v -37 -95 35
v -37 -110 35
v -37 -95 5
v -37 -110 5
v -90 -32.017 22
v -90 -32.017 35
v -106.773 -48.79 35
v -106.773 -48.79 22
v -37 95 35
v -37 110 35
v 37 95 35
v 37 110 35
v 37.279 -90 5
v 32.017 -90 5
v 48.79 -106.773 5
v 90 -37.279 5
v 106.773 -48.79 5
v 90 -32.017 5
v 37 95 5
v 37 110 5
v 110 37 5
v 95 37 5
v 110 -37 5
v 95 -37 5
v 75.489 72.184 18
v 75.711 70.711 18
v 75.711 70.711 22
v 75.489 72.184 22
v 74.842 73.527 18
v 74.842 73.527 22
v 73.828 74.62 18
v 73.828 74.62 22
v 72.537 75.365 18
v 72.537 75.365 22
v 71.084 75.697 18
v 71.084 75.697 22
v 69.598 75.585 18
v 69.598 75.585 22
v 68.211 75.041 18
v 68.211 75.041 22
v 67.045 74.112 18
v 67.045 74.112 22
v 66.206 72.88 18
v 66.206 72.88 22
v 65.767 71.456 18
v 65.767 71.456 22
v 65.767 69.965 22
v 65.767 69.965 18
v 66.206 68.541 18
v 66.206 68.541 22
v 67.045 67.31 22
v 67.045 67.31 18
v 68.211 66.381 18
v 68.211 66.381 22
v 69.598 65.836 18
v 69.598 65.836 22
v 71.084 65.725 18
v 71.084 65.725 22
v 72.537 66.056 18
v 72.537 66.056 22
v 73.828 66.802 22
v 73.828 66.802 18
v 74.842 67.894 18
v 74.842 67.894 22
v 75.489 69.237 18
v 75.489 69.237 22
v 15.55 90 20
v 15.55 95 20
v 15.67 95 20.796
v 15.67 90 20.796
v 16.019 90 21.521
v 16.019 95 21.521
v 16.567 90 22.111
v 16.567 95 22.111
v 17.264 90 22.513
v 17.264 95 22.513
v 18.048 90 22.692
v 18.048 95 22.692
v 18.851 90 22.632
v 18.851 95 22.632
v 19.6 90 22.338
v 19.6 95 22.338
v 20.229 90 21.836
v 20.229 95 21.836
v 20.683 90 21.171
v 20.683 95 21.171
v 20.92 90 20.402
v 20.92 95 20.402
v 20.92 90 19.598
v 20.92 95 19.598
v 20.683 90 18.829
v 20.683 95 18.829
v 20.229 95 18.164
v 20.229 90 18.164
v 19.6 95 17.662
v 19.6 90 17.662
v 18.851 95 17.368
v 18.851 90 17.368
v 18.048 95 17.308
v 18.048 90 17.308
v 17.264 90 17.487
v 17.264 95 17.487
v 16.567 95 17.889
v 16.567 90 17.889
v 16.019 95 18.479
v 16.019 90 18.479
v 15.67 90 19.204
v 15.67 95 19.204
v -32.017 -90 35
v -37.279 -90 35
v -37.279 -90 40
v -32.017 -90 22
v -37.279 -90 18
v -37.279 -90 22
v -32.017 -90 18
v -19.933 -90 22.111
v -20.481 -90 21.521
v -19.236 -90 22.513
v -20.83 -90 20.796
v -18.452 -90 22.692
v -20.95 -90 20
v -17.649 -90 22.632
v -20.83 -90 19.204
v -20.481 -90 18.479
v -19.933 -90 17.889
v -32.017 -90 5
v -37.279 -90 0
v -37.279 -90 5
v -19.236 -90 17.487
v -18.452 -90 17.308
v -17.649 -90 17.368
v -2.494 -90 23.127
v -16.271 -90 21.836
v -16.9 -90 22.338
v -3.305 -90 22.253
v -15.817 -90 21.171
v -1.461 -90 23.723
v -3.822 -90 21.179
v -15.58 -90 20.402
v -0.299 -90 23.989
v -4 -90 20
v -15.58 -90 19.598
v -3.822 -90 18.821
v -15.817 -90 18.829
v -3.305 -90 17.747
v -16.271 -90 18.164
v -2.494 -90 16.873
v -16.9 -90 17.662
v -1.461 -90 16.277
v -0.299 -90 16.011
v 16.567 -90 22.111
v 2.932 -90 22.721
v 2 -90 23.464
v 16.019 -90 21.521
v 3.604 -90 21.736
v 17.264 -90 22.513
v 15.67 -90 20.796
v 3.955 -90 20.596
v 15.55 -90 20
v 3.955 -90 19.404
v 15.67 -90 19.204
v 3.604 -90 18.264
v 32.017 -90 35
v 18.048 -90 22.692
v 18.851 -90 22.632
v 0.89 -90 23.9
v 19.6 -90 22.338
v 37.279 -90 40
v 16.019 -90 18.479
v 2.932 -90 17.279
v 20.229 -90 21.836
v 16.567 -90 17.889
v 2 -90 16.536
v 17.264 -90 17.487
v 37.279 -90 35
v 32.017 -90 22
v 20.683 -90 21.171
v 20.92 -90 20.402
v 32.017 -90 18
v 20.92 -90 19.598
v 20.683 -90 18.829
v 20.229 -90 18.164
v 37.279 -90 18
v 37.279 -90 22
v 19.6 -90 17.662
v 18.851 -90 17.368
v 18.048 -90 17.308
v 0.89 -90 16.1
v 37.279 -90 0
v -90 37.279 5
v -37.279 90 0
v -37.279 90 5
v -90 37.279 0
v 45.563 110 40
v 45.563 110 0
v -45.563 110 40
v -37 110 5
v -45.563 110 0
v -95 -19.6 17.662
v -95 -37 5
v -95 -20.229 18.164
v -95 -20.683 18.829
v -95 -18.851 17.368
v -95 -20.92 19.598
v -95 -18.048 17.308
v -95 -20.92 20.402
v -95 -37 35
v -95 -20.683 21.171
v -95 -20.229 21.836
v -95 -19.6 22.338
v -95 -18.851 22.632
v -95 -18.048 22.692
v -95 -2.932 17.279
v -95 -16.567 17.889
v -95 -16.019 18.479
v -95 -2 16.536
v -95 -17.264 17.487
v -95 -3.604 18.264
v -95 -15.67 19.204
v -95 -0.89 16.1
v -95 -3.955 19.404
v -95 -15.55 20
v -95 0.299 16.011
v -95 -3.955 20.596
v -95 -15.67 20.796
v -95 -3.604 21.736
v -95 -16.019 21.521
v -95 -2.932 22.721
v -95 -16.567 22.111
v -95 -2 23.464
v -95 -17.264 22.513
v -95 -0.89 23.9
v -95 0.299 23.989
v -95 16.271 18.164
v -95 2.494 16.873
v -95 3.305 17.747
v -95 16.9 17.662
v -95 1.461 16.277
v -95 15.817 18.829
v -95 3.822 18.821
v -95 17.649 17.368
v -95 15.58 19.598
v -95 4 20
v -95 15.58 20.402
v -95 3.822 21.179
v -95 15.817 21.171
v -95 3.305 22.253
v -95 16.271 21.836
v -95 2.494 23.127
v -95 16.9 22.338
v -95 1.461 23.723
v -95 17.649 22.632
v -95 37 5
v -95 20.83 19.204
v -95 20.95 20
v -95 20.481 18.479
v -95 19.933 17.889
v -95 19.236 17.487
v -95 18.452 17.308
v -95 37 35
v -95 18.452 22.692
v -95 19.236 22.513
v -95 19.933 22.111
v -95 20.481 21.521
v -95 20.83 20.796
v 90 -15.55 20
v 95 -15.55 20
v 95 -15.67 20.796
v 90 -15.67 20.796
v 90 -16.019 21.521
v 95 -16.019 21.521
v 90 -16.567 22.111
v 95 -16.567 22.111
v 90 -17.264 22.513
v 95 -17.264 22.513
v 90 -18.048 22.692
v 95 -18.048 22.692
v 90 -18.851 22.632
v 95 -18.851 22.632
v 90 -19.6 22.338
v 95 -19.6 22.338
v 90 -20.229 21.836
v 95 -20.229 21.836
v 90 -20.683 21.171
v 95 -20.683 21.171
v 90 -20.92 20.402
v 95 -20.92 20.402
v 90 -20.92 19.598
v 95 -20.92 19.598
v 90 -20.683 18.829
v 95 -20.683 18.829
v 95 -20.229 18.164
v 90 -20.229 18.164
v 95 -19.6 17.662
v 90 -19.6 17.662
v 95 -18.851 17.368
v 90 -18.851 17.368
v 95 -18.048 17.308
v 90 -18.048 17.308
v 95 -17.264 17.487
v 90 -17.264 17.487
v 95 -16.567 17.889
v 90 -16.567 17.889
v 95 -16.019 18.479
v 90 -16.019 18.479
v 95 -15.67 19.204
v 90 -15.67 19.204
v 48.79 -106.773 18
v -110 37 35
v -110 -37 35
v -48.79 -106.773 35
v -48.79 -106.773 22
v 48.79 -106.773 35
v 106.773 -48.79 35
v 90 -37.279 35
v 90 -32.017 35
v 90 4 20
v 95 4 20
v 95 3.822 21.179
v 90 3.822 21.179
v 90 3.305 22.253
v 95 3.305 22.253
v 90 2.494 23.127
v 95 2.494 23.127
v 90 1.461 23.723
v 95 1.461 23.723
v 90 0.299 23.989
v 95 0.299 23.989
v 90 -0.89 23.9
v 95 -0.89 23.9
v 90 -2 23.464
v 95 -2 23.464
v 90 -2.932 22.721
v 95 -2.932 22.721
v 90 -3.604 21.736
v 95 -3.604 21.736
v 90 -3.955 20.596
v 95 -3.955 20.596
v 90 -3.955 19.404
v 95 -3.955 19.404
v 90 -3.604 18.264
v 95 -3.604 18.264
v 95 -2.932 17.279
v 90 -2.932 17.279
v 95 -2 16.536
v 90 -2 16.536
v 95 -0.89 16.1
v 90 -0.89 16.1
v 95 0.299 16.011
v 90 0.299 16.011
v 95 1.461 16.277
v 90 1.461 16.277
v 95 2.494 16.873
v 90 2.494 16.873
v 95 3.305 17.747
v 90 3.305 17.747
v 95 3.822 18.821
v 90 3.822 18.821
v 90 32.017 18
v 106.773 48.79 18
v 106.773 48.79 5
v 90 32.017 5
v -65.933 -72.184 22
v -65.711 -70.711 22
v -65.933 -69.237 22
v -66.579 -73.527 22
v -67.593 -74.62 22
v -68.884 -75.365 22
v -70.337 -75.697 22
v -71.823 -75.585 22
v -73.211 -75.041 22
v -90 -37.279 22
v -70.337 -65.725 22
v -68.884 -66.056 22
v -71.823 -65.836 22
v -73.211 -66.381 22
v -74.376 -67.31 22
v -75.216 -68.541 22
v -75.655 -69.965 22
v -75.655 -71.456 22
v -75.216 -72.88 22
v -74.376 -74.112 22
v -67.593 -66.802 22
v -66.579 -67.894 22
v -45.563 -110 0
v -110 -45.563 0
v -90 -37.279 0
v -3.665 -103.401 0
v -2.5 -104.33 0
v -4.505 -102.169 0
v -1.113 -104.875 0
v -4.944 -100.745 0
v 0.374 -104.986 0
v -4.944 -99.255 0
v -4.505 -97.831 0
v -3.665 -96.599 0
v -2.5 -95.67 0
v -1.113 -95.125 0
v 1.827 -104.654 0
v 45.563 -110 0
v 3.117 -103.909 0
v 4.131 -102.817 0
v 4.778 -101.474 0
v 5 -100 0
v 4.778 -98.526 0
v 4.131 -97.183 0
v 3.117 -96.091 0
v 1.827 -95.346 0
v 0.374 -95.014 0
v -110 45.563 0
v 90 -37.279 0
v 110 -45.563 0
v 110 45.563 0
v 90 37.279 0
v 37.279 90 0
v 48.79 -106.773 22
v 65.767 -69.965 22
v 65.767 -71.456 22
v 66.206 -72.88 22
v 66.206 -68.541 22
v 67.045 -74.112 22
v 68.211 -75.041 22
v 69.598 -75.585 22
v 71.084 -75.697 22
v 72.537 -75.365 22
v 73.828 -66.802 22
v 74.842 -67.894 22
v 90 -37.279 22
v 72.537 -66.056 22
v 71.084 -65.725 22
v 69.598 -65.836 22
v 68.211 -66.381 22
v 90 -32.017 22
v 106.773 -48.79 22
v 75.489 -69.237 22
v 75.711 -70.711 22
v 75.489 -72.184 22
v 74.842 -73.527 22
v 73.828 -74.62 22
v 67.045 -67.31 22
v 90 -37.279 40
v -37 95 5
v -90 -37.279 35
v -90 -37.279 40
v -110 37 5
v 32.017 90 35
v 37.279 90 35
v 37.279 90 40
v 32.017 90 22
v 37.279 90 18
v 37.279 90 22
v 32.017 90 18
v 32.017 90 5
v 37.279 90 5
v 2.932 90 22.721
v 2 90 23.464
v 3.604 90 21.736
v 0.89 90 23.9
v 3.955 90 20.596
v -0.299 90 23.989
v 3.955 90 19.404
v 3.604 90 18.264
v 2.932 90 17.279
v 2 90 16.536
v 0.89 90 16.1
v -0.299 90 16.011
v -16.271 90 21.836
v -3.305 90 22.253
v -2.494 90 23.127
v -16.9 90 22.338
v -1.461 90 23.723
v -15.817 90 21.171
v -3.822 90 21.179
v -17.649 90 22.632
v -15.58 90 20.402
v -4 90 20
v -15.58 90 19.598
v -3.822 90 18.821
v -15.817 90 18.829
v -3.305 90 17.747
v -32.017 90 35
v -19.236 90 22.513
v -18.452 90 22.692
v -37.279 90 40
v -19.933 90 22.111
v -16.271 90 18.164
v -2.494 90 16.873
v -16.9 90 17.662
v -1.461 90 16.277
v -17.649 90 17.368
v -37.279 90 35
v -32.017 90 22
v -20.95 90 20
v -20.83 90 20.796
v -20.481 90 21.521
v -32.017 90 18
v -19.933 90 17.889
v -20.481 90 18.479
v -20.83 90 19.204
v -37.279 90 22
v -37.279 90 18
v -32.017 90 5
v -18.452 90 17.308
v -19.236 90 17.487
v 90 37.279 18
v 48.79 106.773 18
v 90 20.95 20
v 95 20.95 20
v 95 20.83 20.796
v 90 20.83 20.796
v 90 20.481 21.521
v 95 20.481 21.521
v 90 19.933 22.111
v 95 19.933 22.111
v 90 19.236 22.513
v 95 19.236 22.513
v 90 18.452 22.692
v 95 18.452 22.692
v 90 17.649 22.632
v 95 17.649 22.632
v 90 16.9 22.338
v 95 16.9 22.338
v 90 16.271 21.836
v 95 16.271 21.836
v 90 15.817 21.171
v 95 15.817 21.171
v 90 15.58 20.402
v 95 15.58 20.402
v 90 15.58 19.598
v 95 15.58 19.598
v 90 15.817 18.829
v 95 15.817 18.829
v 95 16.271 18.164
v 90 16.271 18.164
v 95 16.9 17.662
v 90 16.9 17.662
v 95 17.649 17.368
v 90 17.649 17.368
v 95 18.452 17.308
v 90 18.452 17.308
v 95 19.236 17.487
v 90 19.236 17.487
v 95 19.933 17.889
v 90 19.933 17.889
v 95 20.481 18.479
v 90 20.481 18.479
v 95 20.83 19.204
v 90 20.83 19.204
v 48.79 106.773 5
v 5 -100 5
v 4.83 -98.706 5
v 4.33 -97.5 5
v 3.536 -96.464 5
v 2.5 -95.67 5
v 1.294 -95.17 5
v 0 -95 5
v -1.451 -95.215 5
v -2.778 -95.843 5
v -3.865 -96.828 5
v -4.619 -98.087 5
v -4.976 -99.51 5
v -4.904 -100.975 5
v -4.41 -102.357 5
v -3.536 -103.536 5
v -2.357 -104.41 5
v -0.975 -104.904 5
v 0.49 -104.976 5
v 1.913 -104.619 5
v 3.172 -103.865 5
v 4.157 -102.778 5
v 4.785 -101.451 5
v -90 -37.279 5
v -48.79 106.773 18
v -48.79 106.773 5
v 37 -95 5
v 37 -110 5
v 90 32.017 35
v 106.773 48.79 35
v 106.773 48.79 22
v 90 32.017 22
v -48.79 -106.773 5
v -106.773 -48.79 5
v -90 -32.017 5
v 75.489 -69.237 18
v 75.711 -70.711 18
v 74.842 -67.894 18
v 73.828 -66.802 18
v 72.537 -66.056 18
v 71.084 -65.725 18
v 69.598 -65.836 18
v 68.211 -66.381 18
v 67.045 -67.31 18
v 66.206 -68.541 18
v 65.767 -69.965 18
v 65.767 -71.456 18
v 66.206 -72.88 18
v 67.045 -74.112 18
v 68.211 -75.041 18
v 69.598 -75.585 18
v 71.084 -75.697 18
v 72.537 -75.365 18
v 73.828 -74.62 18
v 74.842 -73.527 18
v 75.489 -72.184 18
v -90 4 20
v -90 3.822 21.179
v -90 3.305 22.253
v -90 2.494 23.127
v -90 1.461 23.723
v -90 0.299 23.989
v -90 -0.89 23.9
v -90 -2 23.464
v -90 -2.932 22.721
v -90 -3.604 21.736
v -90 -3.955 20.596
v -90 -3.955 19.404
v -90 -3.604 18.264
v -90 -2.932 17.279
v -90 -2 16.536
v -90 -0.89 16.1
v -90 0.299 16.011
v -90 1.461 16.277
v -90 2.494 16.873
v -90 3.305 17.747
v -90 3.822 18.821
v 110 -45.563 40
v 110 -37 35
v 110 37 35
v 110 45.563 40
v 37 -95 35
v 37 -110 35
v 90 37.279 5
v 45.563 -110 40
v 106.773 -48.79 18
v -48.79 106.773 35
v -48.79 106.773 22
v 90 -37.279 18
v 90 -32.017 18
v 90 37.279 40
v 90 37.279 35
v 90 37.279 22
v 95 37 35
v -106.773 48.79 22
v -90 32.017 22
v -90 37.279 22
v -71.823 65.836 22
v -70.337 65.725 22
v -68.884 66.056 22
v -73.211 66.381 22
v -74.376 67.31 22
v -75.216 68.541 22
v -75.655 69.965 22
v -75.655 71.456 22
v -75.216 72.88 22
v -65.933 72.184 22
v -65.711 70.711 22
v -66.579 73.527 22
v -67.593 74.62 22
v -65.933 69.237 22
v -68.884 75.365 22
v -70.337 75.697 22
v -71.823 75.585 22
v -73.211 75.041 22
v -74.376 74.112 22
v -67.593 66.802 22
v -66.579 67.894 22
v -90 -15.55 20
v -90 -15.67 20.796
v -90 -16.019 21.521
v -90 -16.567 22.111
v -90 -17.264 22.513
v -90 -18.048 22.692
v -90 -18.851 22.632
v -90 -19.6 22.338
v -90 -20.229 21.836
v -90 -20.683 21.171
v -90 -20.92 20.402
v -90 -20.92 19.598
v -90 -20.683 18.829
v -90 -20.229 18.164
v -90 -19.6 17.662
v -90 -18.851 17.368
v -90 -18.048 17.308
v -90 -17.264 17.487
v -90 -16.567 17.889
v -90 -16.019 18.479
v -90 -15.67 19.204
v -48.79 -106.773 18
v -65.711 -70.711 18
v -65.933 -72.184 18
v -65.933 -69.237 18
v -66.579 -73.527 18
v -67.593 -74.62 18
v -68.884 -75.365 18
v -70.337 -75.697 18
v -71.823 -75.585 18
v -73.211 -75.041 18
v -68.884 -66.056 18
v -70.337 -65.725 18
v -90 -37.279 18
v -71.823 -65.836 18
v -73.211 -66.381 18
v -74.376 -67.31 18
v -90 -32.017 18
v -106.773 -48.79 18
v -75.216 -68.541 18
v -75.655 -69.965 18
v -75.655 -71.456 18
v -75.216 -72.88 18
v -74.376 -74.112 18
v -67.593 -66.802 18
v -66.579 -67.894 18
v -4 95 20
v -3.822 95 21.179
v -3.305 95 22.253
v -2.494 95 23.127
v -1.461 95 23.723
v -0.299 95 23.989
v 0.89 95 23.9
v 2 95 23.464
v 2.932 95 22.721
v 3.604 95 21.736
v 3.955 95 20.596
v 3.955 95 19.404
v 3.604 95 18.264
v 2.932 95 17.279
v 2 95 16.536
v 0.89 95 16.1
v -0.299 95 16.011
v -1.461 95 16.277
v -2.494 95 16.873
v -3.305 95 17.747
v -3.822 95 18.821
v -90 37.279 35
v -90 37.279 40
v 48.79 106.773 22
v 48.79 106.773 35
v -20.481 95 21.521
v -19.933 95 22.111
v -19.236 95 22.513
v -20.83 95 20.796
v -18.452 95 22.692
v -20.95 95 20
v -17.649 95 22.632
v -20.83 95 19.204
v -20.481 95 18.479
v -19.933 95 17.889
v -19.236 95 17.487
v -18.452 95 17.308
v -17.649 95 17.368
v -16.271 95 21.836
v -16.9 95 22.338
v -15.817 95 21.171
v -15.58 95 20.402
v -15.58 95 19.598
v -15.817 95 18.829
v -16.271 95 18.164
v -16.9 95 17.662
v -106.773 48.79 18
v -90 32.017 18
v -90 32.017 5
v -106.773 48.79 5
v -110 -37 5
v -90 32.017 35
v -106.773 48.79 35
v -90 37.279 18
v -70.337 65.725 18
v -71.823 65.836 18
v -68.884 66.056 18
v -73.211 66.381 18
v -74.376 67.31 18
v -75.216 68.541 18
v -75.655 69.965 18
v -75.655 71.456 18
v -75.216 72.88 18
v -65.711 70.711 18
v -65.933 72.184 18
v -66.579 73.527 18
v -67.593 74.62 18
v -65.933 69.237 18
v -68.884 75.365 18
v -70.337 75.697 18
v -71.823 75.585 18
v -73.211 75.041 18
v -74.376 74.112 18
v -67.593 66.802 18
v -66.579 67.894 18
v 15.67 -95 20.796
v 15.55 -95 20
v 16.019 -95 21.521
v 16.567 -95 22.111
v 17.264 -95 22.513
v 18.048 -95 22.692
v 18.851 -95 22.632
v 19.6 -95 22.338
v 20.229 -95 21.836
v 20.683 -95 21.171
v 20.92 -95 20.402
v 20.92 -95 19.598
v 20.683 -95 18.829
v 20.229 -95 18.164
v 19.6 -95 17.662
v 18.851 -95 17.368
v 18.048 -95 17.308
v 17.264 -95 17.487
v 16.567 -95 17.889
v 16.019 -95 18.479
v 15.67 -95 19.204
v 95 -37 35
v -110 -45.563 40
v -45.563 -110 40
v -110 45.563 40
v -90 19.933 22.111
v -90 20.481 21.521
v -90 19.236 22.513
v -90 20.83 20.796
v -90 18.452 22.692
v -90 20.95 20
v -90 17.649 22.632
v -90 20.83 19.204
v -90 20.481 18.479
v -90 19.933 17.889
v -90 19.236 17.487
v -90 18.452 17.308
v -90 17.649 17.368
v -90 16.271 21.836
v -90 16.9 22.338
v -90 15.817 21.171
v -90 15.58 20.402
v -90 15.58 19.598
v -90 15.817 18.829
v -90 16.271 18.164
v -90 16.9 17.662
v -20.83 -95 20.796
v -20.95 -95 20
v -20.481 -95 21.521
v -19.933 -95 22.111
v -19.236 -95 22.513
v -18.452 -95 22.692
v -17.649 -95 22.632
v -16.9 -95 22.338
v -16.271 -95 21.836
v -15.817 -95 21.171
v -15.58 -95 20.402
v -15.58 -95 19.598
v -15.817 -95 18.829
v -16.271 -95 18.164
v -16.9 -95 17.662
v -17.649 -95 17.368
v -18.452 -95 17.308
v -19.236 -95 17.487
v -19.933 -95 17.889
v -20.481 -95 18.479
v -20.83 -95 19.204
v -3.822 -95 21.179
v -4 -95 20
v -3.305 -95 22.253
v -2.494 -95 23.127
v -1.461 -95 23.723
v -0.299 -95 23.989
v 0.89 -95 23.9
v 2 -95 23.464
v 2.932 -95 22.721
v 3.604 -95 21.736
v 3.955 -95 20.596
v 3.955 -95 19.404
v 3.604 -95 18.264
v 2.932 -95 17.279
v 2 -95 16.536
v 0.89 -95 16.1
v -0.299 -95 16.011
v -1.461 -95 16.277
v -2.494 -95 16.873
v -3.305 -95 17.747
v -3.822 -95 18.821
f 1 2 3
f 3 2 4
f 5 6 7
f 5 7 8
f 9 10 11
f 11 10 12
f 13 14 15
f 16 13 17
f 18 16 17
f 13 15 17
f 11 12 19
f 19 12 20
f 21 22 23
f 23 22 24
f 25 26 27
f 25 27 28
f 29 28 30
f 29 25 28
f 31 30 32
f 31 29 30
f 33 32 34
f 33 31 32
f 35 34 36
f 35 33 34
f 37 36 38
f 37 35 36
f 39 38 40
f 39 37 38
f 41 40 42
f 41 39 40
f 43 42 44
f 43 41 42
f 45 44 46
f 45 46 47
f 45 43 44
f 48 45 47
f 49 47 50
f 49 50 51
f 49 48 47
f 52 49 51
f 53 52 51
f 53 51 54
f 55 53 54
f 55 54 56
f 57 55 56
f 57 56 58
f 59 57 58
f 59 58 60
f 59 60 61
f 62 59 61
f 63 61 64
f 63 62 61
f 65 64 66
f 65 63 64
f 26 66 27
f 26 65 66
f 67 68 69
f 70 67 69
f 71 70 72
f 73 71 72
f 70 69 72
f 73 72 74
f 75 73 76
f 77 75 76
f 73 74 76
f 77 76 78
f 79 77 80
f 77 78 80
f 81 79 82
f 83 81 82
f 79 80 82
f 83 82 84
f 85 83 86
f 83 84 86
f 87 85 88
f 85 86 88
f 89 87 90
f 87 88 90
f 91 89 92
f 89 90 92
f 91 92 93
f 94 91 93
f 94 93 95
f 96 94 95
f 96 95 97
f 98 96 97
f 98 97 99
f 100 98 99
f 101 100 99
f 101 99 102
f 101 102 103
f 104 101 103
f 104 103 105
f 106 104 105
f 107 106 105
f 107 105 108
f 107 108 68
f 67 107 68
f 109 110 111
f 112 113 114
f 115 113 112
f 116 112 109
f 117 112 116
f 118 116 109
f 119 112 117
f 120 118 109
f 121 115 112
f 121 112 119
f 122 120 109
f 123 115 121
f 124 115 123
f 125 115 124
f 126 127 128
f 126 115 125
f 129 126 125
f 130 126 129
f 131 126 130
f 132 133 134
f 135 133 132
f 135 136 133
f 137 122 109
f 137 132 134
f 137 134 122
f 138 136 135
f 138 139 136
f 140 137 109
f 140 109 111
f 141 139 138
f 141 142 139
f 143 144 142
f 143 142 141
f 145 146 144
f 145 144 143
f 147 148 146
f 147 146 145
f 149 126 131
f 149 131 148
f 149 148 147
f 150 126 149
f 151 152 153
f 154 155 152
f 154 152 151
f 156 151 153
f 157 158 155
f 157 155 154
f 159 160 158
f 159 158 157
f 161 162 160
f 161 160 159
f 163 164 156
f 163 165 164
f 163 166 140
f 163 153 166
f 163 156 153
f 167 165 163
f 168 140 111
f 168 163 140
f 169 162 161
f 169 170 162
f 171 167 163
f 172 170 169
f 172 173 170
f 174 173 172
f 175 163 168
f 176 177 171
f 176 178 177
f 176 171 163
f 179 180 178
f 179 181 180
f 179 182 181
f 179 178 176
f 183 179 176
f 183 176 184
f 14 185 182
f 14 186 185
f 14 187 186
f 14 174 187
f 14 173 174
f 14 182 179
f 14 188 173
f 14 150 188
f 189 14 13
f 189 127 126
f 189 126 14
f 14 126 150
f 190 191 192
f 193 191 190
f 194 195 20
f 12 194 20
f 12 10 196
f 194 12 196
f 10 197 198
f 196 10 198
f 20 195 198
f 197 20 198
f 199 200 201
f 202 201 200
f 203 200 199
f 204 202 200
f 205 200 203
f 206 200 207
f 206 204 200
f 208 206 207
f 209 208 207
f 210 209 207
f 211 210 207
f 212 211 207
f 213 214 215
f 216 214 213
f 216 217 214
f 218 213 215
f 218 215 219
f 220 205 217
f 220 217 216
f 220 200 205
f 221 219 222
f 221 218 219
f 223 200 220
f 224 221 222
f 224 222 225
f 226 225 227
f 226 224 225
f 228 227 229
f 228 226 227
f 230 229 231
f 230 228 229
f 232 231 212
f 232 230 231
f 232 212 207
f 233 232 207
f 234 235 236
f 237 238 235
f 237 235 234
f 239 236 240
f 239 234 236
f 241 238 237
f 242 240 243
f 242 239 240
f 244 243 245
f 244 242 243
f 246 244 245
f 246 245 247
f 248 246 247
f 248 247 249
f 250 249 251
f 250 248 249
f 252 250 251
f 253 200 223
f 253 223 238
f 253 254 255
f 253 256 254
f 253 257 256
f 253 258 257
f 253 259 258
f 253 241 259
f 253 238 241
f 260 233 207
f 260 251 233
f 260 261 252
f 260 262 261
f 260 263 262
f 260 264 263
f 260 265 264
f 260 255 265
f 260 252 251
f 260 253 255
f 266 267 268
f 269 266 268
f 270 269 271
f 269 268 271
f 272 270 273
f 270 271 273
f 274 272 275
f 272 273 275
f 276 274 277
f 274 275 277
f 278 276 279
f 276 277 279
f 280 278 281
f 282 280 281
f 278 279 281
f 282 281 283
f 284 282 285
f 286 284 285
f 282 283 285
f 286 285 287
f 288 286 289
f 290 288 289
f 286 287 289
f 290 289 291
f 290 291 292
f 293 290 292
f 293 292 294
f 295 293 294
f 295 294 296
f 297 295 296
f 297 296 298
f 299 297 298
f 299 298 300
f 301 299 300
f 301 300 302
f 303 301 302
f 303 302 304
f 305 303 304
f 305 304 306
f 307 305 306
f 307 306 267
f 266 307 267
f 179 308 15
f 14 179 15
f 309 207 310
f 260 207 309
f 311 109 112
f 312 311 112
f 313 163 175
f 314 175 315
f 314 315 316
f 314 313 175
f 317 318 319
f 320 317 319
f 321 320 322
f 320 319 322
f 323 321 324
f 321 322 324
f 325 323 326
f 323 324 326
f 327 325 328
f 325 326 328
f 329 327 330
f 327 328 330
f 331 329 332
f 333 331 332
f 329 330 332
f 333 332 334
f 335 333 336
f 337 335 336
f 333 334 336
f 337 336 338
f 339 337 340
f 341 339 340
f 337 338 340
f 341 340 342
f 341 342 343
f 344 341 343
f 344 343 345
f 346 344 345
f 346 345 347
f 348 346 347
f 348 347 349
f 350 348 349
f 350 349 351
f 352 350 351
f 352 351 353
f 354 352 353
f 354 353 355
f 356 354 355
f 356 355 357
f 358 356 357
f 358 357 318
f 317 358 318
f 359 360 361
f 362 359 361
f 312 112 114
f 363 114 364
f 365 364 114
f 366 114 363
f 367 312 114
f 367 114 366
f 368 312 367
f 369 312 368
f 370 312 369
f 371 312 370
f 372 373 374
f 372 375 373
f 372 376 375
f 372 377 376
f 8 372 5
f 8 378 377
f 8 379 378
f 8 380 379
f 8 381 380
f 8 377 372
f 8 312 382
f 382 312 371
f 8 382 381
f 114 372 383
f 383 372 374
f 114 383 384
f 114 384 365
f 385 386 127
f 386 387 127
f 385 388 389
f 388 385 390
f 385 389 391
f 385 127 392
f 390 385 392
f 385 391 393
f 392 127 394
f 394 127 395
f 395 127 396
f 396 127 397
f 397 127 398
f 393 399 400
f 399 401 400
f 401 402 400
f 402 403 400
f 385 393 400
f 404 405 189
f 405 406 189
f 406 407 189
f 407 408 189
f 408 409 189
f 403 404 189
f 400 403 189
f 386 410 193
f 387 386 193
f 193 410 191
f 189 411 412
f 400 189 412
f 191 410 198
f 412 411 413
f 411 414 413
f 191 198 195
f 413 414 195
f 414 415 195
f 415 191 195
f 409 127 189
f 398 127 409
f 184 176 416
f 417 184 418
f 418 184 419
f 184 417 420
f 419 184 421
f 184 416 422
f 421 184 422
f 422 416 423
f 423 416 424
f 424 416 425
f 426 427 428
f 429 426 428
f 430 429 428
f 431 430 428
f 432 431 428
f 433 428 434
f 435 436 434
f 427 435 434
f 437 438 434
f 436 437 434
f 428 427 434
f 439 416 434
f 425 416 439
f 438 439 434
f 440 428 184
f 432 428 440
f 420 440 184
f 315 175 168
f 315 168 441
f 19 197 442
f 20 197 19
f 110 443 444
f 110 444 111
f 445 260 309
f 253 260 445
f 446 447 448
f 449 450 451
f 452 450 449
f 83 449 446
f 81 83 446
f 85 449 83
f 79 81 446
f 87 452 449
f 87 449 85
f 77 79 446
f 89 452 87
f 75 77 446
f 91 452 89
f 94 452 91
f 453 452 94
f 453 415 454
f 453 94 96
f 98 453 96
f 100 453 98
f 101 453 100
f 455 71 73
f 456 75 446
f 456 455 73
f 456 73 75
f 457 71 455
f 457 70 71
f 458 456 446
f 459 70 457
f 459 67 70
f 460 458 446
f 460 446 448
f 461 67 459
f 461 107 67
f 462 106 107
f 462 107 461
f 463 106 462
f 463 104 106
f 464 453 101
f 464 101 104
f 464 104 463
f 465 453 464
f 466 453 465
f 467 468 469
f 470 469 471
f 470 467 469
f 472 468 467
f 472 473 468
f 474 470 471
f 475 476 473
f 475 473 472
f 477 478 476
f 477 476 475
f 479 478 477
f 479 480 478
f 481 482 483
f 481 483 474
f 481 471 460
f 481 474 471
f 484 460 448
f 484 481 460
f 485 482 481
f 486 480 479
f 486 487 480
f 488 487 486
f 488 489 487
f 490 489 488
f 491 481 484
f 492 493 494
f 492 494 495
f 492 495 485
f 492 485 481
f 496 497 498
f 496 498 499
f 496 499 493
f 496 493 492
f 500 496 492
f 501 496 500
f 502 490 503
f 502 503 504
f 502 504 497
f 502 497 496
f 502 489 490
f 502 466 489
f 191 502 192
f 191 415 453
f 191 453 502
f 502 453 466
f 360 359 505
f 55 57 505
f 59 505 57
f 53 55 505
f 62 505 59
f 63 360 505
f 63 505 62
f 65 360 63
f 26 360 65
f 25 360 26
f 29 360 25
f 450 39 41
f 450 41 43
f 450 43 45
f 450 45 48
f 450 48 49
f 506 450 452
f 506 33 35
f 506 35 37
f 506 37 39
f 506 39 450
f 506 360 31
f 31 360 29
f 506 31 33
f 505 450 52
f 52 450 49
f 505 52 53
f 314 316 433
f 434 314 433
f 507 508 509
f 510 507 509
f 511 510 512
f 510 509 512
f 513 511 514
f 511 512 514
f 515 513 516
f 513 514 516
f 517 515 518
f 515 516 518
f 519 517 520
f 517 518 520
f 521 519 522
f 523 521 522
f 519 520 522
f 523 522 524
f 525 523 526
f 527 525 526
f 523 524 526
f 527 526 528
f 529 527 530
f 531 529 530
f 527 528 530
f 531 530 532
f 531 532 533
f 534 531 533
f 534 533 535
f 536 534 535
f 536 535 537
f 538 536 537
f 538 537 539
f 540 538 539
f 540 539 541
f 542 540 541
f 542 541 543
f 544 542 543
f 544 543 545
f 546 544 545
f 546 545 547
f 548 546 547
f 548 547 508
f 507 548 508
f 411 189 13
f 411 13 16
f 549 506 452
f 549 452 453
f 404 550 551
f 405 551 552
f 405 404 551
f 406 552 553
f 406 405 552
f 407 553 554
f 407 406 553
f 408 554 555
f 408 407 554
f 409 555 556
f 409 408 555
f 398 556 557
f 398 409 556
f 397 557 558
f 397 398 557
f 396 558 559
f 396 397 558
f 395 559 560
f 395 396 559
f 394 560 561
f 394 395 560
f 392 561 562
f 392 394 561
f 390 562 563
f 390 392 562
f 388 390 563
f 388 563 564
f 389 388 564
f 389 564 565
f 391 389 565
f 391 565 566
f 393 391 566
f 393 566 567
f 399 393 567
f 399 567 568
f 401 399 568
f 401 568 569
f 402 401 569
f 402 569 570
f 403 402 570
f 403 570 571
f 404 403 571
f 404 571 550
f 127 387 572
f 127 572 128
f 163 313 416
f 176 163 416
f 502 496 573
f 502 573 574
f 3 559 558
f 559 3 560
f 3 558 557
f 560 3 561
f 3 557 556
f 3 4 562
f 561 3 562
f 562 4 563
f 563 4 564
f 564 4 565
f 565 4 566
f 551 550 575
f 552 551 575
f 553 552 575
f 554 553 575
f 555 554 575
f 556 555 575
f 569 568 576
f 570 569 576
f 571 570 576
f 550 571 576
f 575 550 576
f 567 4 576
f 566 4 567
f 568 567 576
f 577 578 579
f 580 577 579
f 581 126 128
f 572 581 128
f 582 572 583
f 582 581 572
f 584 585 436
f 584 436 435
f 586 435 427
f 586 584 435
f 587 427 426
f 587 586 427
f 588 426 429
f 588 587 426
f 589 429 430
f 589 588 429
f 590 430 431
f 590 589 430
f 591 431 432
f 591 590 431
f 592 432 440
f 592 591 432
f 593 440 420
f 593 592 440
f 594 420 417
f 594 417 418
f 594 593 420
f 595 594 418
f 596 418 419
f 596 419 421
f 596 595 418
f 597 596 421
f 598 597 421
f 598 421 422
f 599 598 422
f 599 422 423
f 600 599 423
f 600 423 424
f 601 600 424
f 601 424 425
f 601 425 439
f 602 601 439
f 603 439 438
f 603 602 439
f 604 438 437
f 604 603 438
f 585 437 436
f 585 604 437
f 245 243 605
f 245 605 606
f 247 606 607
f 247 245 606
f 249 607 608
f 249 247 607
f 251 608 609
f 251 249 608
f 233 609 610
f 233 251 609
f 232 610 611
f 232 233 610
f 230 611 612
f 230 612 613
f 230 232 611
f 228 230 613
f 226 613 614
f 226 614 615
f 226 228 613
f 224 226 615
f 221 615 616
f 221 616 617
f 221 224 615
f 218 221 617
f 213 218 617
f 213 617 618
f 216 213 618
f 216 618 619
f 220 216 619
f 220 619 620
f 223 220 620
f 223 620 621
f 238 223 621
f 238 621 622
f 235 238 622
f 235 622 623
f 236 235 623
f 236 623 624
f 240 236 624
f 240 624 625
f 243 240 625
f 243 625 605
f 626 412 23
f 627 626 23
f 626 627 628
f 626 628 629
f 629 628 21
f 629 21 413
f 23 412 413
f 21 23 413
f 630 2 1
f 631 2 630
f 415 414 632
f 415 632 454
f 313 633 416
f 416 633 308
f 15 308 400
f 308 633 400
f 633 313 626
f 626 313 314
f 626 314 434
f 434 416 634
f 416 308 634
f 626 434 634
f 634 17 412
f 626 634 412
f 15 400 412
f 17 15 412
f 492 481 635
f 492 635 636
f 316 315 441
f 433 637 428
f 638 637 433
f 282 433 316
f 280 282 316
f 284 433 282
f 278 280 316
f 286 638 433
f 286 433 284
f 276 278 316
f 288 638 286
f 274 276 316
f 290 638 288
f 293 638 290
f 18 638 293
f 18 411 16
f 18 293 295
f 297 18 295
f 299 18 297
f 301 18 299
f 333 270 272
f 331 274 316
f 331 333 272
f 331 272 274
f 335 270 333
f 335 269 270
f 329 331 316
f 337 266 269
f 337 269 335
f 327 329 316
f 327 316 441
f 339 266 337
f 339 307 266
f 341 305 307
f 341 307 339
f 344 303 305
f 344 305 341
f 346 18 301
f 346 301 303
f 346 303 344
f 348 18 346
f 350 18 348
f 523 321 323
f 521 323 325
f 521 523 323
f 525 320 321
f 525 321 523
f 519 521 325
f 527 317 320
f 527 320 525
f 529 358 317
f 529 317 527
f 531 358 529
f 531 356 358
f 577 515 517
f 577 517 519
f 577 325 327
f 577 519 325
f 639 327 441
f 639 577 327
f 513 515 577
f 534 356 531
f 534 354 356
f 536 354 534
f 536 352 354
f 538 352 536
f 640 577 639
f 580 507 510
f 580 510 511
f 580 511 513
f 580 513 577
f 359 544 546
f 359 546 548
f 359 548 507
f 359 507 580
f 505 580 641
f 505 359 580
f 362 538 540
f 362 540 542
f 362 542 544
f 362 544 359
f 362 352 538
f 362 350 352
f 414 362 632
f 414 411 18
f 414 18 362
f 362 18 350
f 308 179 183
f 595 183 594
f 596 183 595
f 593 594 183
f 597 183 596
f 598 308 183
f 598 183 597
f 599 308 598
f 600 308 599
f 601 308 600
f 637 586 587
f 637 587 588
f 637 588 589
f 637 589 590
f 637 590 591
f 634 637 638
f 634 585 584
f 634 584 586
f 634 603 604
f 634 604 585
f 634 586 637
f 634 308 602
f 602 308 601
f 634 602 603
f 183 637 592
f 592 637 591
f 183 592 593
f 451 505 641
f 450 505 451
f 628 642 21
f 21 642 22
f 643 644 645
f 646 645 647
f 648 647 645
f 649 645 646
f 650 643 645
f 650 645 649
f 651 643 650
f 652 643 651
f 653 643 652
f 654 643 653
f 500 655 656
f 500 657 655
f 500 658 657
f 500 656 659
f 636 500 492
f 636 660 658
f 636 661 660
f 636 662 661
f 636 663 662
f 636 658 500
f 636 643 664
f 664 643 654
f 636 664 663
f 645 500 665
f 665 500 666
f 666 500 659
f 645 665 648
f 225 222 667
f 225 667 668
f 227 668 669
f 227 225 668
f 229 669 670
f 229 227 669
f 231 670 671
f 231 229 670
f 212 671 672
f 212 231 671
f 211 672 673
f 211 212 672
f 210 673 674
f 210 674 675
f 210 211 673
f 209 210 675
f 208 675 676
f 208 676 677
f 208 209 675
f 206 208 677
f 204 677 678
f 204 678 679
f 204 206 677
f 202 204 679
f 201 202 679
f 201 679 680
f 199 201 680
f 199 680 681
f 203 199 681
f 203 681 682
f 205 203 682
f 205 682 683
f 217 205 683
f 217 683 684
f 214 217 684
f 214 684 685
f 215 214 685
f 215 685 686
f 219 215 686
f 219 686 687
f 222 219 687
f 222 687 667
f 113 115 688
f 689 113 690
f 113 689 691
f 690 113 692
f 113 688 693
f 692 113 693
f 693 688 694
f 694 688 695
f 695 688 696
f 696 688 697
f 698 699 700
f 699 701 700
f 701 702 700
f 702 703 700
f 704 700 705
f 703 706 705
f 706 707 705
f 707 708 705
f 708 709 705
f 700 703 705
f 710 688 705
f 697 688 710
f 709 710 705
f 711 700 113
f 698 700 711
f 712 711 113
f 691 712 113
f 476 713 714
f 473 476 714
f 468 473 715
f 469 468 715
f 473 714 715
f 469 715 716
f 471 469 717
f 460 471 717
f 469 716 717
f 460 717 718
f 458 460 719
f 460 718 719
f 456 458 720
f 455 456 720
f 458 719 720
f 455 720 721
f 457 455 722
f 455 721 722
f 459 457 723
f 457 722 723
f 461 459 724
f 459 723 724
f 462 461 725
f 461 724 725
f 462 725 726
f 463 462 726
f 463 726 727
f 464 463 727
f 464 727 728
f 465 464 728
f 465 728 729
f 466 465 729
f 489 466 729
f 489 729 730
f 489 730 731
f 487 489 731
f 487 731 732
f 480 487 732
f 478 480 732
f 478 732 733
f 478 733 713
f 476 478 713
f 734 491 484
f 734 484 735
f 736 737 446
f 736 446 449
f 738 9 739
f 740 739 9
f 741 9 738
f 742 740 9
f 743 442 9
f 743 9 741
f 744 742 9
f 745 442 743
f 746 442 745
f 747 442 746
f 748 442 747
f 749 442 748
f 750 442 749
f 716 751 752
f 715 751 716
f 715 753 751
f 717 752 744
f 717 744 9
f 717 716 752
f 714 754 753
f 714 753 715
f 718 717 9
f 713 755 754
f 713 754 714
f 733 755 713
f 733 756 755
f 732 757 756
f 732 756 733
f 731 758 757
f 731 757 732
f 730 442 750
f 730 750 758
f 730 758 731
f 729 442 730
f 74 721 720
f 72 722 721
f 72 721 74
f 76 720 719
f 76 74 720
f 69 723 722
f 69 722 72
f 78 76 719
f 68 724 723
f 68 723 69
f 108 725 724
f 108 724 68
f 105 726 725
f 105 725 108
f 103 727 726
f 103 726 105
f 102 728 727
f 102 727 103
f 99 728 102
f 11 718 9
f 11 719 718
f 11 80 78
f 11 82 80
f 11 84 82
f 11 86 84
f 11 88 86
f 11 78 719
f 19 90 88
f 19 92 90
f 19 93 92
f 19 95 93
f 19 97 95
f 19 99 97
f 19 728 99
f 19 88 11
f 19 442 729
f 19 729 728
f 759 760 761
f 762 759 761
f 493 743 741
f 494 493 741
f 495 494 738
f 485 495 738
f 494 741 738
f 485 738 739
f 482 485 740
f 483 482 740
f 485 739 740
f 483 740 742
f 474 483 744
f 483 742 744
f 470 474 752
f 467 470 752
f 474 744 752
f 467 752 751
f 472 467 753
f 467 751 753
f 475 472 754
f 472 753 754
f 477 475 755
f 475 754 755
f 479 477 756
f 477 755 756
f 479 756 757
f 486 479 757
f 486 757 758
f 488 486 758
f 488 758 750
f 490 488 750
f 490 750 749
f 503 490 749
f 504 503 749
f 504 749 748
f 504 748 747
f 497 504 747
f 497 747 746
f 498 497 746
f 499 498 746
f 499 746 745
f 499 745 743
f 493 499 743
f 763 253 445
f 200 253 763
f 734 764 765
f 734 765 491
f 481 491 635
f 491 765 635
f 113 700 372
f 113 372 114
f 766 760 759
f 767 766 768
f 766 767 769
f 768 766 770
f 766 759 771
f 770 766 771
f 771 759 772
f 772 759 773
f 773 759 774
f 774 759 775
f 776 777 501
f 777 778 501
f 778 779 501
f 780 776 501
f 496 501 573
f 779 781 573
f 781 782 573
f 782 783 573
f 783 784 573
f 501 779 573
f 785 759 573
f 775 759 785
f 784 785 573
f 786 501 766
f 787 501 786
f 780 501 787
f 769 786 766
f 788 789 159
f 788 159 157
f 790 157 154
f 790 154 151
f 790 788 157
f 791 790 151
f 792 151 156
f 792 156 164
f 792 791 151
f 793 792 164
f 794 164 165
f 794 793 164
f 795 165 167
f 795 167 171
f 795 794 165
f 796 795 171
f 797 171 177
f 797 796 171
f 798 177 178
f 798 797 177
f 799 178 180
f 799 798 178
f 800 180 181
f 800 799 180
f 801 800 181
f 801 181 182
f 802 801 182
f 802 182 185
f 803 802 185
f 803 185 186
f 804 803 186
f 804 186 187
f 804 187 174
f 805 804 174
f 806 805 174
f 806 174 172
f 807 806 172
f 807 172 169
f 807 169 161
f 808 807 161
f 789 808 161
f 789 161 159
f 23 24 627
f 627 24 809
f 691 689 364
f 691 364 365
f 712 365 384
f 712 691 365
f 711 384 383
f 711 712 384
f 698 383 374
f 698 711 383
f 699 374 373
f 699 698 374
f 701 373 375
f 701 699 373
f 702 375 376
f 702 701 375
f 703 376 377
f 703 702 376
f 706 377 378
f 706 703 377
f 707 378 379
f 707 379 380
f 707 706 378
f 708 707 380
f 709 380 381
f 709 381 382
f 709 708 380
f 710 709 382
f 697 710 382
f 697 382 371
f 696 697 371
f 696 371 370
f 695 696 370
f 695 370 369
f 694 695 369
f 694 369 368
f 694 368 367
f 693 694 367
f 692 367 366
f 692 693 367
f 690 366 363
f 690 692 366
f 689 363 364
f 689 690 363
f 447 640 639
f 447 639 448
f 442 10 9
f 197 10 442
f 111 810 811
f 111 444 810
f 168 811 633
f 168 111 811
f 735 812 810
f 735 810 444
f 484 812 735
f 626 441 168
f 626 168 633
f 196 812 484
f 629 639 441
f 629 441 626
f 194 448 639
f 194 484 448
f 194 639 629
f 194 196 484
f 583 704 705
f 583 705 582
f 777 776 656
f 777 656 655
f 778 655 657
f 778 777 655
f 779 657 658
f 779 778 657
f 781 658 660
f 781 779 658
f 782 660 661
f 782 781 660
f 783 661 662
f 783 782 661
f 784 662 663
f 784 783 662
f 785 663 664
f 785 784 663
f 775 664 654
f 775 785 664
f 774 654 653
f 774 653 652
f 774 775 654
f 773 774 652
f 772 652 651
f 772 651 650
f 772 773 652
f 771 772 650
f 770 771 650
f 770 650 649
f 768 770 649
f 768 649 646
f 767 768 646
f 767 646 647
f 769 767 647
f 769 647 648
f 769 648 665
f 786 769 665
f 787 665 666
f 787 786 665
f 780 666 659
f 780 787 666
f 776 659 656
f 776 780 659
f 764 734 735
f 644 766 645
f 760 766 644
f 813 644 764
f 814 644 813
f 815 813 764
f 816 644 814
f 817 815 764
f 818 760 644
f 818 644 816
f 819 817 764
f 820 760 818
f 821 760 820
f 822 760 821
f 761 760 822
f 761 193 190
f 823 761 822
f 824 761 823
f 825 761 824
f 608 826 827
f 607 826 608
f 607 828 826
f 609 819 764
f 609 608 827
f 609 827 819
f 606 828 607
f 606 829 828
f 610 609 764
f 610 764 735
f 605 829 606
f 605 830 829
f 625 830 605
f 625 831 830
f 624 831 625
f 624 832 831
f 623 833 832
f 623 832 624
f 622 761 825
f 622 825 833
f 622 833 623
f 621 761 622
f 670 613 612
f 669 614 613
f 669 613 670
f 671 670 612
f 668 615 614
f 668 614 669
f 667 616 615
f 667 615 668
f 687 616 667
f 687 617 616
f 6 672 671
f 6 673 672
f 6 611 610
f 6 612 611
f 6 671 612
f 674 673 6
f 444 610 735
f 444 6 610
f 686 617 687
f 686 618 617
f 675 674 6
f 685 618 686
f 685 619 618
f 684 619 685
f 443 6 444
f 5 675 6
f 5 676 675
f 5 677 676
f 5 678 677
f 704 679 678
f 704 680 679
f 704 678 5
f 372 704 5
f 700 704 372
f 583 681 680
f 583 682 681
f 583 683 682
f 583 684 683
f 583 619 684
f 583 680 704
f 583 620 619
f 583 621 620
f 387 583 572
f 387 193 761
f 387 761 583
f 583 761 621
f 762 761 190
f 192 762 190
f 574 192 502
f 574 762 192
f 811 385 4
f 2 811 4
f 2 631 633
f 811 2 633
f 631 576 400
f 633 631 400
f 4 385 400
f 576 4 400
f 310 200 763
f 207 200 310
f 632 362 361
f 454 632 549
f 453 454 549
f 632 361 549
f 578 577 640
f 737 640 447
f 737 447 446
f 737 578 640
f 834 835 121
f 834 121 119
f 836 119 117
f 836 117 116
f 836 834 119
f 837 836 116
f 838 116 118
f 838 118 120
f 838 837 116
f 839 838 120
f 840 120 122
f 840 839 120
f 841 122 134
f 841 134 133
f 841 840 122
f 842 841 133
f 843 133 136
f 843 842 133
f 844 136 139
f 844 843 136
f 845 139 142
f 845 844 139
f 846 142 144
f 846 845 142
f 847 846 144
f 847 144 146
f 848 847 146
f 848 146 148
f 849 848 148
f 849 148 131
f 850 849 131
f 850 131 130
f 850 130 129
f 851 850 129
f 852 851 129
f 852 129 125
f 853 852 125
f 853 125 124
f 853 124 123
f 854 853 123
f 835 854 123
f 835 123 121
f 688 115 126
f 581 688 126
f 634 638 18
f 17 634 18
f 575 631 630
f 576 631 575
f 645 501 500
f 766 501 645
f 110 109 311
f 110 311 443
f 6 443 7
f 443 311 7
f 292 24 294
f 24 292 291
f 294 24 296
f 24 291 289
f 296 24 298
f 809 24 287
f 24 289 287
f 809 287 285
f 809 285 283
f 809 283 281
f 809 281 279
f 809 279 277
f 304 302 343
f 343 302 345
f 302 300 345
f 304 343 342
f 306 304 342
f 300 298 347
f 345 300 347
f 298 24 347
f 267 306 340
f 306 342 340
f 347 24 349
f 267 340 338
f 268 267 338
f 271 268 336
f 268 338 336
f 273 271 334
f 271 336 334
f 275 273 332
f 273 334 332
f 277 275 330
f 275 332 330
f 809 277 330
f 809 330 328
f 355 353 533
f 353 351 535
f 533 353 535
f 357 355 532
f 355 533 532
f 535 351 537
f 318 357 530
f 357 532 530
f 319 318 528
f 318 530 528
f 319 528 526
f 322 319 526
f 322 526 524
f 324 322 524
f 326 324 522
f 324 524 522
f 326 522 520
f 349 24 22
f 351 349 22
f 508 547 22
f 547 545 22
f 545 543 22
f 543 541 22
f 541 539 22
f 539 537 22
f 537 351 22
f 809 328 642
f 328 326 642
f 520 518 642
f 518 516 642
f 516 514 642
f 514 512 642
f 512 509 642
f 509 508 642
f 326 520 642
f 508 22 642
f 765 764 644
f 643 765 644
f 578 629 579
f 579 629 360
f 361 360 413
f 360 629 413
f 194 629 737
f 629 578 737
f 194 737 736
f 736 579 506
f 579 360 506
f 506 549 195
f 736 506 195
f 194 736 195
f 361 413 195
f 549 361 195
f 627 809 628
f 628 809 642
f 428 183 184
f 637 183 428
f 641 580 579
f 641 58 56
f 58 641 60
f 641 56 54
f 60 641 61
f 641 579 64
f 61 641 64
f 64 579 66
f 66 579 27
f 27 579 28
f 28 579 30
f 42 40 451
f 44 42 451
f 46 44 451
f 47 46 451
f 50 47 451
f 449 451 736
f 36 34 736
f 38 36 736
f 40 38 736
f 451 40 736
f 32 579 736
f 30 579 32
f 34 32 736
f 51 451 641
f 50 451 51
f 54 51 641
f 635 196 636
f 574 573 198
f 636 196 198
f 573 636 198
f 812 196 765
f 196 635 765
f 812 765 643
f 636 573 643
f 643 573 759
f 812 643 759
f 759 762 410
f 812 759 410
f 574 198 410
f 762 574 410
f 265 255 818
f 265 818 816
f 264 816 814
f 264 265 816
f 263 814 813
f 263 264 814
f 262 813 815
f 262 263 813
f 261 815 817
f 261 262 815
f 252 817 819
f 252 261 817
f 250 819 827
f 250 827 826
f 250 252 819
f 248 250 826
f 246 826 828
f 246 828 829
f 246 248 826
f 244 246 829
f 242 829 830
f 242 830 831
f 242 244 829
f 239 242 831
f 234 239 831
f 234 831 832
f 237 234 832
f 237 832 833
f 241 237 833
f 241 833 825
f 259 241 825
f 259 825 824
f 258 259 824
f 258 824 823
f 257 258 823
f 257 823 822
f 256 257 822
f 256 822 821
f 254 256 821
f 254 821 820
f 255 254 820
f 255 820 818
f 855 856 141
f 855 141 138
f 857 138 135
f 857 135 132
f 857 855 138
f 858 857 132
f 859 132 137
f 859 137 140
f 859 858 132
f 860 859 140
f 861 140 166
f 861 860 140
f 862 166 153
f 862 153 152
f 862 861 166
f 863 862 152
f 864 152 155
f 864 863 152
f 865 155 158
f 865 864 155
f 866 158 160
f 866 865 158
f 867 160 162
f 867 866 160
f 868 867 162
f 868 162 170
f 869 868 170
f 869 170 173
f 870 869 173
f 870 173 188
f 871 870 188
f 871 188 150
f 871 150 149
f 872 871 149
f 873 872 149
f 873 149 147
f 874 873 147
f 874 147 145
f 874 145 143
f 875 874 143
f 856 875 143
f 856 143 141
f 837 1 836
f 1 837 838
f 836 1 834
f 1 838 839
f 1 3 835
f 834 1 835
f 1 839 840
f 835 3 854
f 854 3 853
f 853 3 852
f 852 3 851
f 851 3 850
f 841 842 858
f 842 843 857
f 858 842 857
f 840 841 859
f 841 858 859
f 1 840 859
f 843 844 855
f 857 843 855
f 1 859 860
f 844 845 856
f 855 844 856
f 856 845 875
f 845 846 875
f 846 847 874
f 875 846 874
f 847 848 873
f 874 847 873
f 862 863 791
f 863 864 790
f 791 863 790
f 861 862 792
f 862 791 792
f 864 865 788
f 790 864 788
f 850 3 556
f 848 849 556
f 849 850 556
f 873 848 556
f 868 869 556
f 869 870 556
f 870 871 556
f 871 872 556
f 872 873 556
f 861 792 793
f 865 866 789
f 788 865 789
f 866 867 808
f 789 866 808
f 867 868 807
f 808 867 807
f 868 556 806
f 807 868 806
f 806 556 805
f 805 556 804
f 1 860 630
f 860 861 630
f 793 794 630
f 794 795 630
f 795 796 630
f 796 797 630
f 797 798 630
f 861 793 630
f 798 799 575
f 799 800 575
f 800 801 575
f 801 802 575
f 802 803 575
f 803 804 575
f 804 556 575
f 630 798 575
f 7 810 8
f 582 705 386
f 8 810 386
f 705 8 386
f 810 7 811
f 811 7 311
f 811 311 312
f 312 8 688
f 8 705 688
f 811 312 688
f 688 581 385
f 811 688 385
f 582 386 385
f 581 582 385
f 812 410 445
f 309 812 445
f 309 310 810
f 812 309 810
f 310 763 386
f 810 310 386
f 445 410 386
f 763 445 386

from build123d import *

# Parameters (mm, degrees)
RESSALTO_EXTRUS_O1_DEPTH = 40
CORTE_EXTRUS_O1_START    = -15
ESBO_O2_W                = 30
ESBO_O2_H                = 74
ESBO_O2_R                = 2.7
ESBO_O2_R_2              = 4
CORTE_EXTRUS_O1_DEPTH    = 265.198715888
CORTE_EXTRUS_O6_REACH    = 251.199
ESBO_O2_3_R              = 4
ESBO_O2_3_R_2            = 2.7
CORTE_EXTRUS_O2_REACH    = 251.199
ESBO_O3_R                = 4
ESBO_O3_R_2              = 2.7
ESBO_O3_3_W              = 74
ESBO_O3_3_H              = 30
ESBO_O3_3_R              = 2.7
ESBO_O3_3_R_2            = 4
CORTE_EXTRUS_O7_DEPTH    = 15
CORTE_EXTRUS_O3_REACH    = 270.559
ESBO_O4_W                = 13
ESBO_O4_H                = 82
CORTE_EXTRUS_O8_REACH    = 270.559
ESBO_O9_W                = 13
ESBO_O9_H                = 82
CORTE_EXTRUS_O9_REACH    = 180.624
CORTE_EXTRUS_O9_START    = -18
ESBO_O10_R               = 5


with BuildPart() as part:
    # Esboço1 → Ressalto-extrusão1 (new body)
    with BuildSketch(Plane.XY):
        Polygon((110, 45.563491861), (45.563491861, 110), (-45.563491861, 110), (-110, 45.563491861), (-110, -45.563491861), (-45.563491861, -110), (45.563491861, -110), (110, -45.563491861), align=None)
        Polygon((90, 37.279220614), (37.279220614, 90), (-37.279220614, 90), (-90, 37.279220614), (-90, -37.279220614), (-37.279220614, -90), (37.279220614, -90), (90, -37.279220614), align=None, mode=Mode.SUBTRACT)
    extrude(amount=RESSALTO_EXTRUS_O1_DEPTH)

    # Esboço2 → Corte-extrusão1 (cut)
    with BuildSketch(Plane(origin=(110, 0, 0), x_dir=(0, 0, -1), z_dir=(1, 0, 0)).offset(CORTE_EXTRUS_O1_START)):
        with Locations((-20, 0)):
            Rectangle(ESBO_O2_W, ESBO_O2_H)
        with Locations((-20, -18.25)):
            Circle(ESBO_O2_R, mode=Mode.SUBTRACT)
        with Locations((-20, 0)):
            Circle(ESBO_O2_R_2, mode=Mode.SUBTRACT)
        with Locations((-20, 18.25)):
            Circle(ESBO_O2_R, mode=Mode.SUBTRACT)
    corte_extrus_o1 = extrude(amount=CORTE_EXTRUS_O1_DEPTH, mode=Mode.SUBTRACT)

    # Esboço2<3> → Corte-extrusão6 (cut, up to next)
    with BuildSketch(Plane(origin=(110, 0, 0), x_dir=(0, 0, -1), z_dir=(1, 0, 0)), mode=Mode.PRIVATE) as corte_extrus_o6_sk1:
        with Locations((-20, 0)):
            Circle(ESBO_O2_3_R)
    corte_extrus_o6_tool1 = extrude(corte_extrus_o6_sk1.sketch, amount=-CORTE_EXTRUS_O6_REACH, mode=Mode.PRIVATE) & part.part
    # Esboço2<3> → Corte-extrusão6 (cut, up to next)
    with BuildSketch(Plane(origin=(110, 0, 0), x_dir=(0, 0, -1), z_dir=(1, 0, 0)), mode=Mode.PRIVATE) as corte_extrus_o6_sk2:
        with Locations((-20, 18.25)):
            Circle(ESBO_O2_3_R_2)
    corte_extrus_o6_tool2 = extrude(corte_extrus_o6_sk2.sketch, amount=-CORTE_EXTRUS_O6_REACH, mode=Mode.PRIVATE) & part.part
    # Esboço2<3> → Corte-extrusão6 (cut, up to next)
    with BuildSketch(Plane(origin=(110, 0, 0), x_dir=(0, 0, -1), z_dir=(1, 0, 0)), mode=Mode.PRIVATE) as corte_extrus_o6_sk3:
        with Locations((-20, -18.25)):
            Circle(ESBO_O2_3_R_2)
    corte_extrus_o6_tool3 = extrude(corte_extrus_o6_sk3.sketch, amount=-CORTE_EXTRUS_O6_REACH, mode=Mode.PRIVATE) & part.part
    corte_extrus_o6_1 = corte_extrus_o6_tool1.solids().sort_by_distance((110, 0, 20))[0]
    add(corte_extrus_o6_1, mode=Mode.SUBTRACT)
    corte_extrus_o6_2 = corte_extrus_o6_tool2.solids().sort_by_distance((110, 18.25, 20))[0]
    add(corte_extrus_o6_2, mode=Mode.SUBTRACT)
    corte_extrus_o6_3 = corte_extrus_o6_tool3.solids().sort_by_distance((110, -18.25, 20))[0]
    add(corte_extrus_o6_3, mode=Mode.SUBTRACT)
    corte_extrus_o6 = corte_extrus_o6_1 + corte_extrus_o6_2 + corte_extrus_o6_3  # Corte-extrusão6 as one shape, for the pattern or mirror that repeats it

    # Esboço3 → Corte-extrusão2 (cut, up to next)
    with BuildSketch(Plane(origin=(0, 110, 0), x_dir=(1, 0, 0), z_dir=(0, 1, 0)), mode=Mode.PRIVATE) as corte_extrus_o2_sk1:
        with Locations((0, -20)):
            Circle(ESBO_O3_R)
    corte_extrus_o2_tool1 = extrude(corte_extrus_o2_sk1.sketch, amount=-CORTE_EXTRUS_O2_REACH, mode=Mode.PRIVATE) & part.part
    # Esboço3 → Corte-extrusão2 (cut, up to next)
    with BuildSketch(Plane(origin=(0, 110, 0), x_dir=(1, 0, 0), z_dir=(0, 1, 0)), mode=Mode.PRIVATE) as corte_extrus_o2_sk2:
        with Locations((18.25, -20)):
            Circle(ESBO_O3_R_2)
    corte_extrus_o2_tool2 = extrude(corte_extrus_o2_sk2.sketch, amount=-CORTE_EXTRUS_O2_REACH, mode=Mode.PRIVATE) & part.part
    # Esboço3 → Corte-extrusão2 (cut, up to next)
    with BuildSketch(Plane(origin=(0, 110, 0), x_dir=(1, 0, 0), z_dir=(0, 1, 0)), mode=Mode.PRIVATE) as corte_extrus_o2_sk3:
        with Locations((-18.25, -20)):
            Circle(ESBO_O3_R_2)
    corte_extrus_o2_tool3 = extrude(corte_extrus_o2_sk3.sketch, amount=-CORTE_EXTRUS_O2_REACH, mode=Mode.PRIVATE) & part.part
    corte_extrus_o2_1 = corte_extrus_o2_tool1.solids().sort_by_distance((0, 110, 20))[0]
    add(corte_extrus_o2_1, mode=Mode.SUBTRACT)
    corte_extrus_o2_2 = corte_extrus_o2_tool2.solids().sort_by_distance((18.25, 110, 20))[0]
    add(corte_extrus_o2_2, mode=Mode.SUBTRACT)
    corte_extrus_o2_3 = corte_extrus_o2_tool3.solids().sort_by_distance((-18.25, 110, 20))[0]
    add(corte_extrus_o2_3, mode=Mode.SUBTRACT)
    corte_extrus_o2 = corte_extrus_o2_1 + corte_extrus_o2_2 + corte_extrus_o2_3  # Corte-extrusão2 as one shape, for the pattern or mirror that repeats it

    # Espelhar1: Corte-extrusão1, Corte-extrusão6 across plane
    add(corte_extrus_o1.mirror(Plane(origin=(0, 0, 0), x_dir=(0, 0, 1), z_dir=(1, 0, 0))), mode=Mode.SUBTRACT)
    add(corte_extrus_o6.mirror(Plane(origin=(0, 0, 0), x_dir=(0, 0, 1), z_dir=(1, 0, 0))), mode=Mode.SUBTRACT)

    # Esboço3<3> → Corte-extrusão7 (cut)
    with BuildSketch(Plane(origin=(0, 110, 0), x_dir=(1, 0, 0), z_dir=(0, 1, 0))):
        with Locations((0, -20)):
            Rectangle(ESBO_O3_3_W, ESBO_O3_3_H)
        with Locations((-18.25, -20)):
            Circle(ESBO_O3_3_R, mode=Mode.SUBTRACT)
        with Locations((0, -20)):
            Circle(ESBO_O3_3_R_2, mode=Mode.SUBTRACT)
        with Locations((18.25, -20)):
            Circle(ESBO_O3_3_R, mode=Mode.SUBTRACT)
    corte_extrus_o7 = extrude(amount=-CORTE_EXTRUS_O7_DEPTH, mode=Mode.SUBTRACT)

    # Espelhar2: Corte-extrusão2, Corte-extrusão7 across plane
    add(corte_extrus_o2.mirror(Plane.ZX), mode=Mode.SUBTRACT)
    add(corte_extrus_o7.mirror(Plane.ZX), mode=Mode.SUBTRACT)

    # Esboço4 → Corte-extrusão3 (cut, up to next)
    with BuildSketch(Plane(origin=(77.781745931, 77.781745931, 0), x_dir=(0, 0, -1), z_dir=(0.707106781186547, 0.7071067811865481, 0)), mode=Mode.PRIVATE) as corte_extrus_o3_sk1:
        with Locations((-28.5, 0)):
            Rectangle(ESBO_O4_W, ESBO_O4_H)
    corte_extrus_o3_tool1 = extrude(corte_extrus_o3_sk1.sketch, amount=-CORTE_EXTRUS_O3_REACH, mode=Mode.PRIVATE) & part.part
    # Esboço4 → Corte-extrusão3 (cut, up to next)
    with BuildSketch(Plane(origin=(77.781745931, 77.781745931, 0), x_dir=(0, 0, -1), z_dir=(0.707106781186547, 0.7071067811865481, 0)), mode=Mode.PRIVATE) as corte_extrus_o3_sk2:
        with Locations((-11.5, 0)):
            Rectangle(ESBO_O4_W, ESBO_O4_H)
    corte_extrus_o3_tool2 = extrude(corte_extrus_o3_sk2.sketch, amount=-CORTE_EXTRUS_O3_REACH, mode=Mode.PRIVATE) & part.part
    corte_extrus_o3_1 = corte_extrus_o3_tool1.solids().sort_by_distance((77.781746, 77.781746, 28.5))[0]
    add(corte_extrus_o3_1, mode=Mode.SUBTRACT)
    corte_extrus_o3_2 = corte_extrus_o3_tool2.solids().sort_by_distance((77.781746, 77.781746, 11.5))[0]
    add(corte_extrus_o3_2, mode=Mode.SUBTRACT)
    corte_extrus_o3 = corte_extrus_o3_1 + corte_extrus_o3_2  # Corte-extrusão3 as one shape, for the pattern or mirror that repeats it

    # Espelhar3: Corte-extrusão3 across plane
    add(corte_extrus_o3.mirror(Plane(origin=(0, 0, 0), x_dir=(0, 0, 1), z_dir=(0.7071067811865475, 0.7071067811865477, 0))), mode=Mode.SUBTRACT)

    # Esboço9 → Corte-extrusão8 (cut, up to next)
    with BuildSketch(Plane(origin=(77.781745931, -77.781745931, 0), x_dir=(0, 0, -1), z_dir=(0.7071067811865479, -0.7071067811865471, 0)), mode=Mode.PRIVATE) as corte_extrus_o8_sk1:
        with Locations((-28.5, 0)):
            Rectangle(ESBO_O9_W, ESBO_O9_H)
    corte_extrus_o8_tool1 = extrude(corte_extrus_o8_sk1.sketch, amount=-CORTE_EXTRUS_O8_REACH, mode=Mode.PRIVATE) & part.part
    # Esboço9 → Corte-extrusão8 (cut, up to next)
    with BuildSketch(Plane(origin=(77.781745931, -77.781745931, 0), x_dir=(0, 0, -1), z_dir=(0.7071067811865479, -0.7071067811865471, 0)), mode=Mode.PRIVATE) as corte_extrus_o8_sk2:
        with Locations((-11.5, 0)):
            Rectangle(ESBO_O9_W, ESBO_O9_H)
    corte_extrus_o8_tool2 = extrude(corte_extrus_o8_sk2.sketch, amount=-CORTE_EXTRUS_O8_REACH, mode=Mode.PRIVATE) & part.part
    corte_extrus_o8_1 = corte_extrus_o8_tool1.solids().sort_by_distance((77.781746, -77.781746, 28.5))[0]
    add(corte_extrus_o8_1, mode=Mode.SUBTRACT)
    corte_extrus_o8_2 = corte_extrus_o8_tool2.solids().sort_by_distance((77.781746, -77.781746, 11.5))[0]
    add(corte_extrus_o8_2, mode=Mode.SUBTRACT)
    corte_extrus_o8 = corte_extrus_o8_1 + corte_extrus_o8_2  # Corte-extrusão8 as one shape, for the pattern or mirror that repeats it

    # Espelhar4: Corte-extrusão8 across plane
    add(corte_extrus_o8.mirror(Plane(origin=(0, 0, 0), x_dir=(0, 0, 1), z_dir=(0.7071067811865475, -0.7071067811865477, 0))), mode=Mode.SUBTRACT)

    # Esboço10 → Corte-extrusão9 (cut, up to next)
    with BuildSketch(Plane.XY.offset(40).offset(CORTE_EXTRUS_O9_START), mode=Mode.PRIVATE) as corte_extrus_o9_sk1:
        with Locations((0, -100)):
            Circle(ESBO_O10_R)
    corte_extrus_o9_tool1 = extrude(corte_extrus_o9_sk1.sketch, amount=-CORTE_EXTRUS_O9_REACH, mode=Mode.PRIVATE) & part.part
    # Esboço10 → Corte-extrusão9 (cut, up to next)
    with BuildSketch(Plane.XY.offset(40).offset(CORTE_EXTRUS_O9_START), mode=Mode.PRIVATE) as corte_extrus_o9_sk2:
        with Locations((-70.710678119, -70.710678119)):
            Circle(ESBO_O10_R)
    corte_extrus_o9_tool2 = extrude(corte_extrus_o9_sk2.sketch, amount=-CORTE_EXTRUS_O9_REACH, mode=Mode.PRIVATE) & part.part
    # Esboço10 → Corte-extrusão9 (cut, up to next)
    with BuildSketch(Plane.XY.offset(40).offset(CORTE_EXTRUS_O9_START), mode=Mode.PRIVATE) as corte_extrus_o9_sk3:
        with Locations((-70.710678119, 70.710678119)):
            Circle(ESBO_O10_R)
    corte_extrus_o9_tool3 = extrude(corte_extrus_o9_sk3.sketch, amount=-CORTE_EXTRUS_O9_REACH, mode=Mode.PRIVATE) & part.part
    # Esboço10 → Corte-extrusão9 (cut, up to next)
    with BuildSketch(Plane.XY.offset(40).offset(CORTE_EXTRUS_O9_START), mode=Mode.PRIVATE) as corte_extrus_o9_sk4:
        with Locations((70.710678119, 70.710678119)):
            Circle(ESBO_O10_R)
    corte_extrus_o9_tool4 = extrude(corte_extrus_o9_sk4.sketch, amount=-CORTE_EXTRUS_O9_REACH, mode=Mode.PRIVATE) & part.part
    # Esboço10 → Corte-extrusão9 (cut, up to next)
    with BuildSketch(Plane.XY.offset(40).offset(CORTE_EXTRUS_O9_START), mode=Mode.PRIVATE) as corte_extrus_o9_sk5:
        with Locations((70.710678119, -70.710678119)):
            Circle(ESBO_O10_R)
    corte_extrus_o9_tool5 = extrude(corte_extrus_o9_sk5.sketch, amount=-CORTE_EXTRUS_O9_REACH, mode=Mode.PRIVATE) & part.part
    add(corte_extrus_o9_tool1.solids().sort_by_distance((0, -100, 22))[0], mode=Mode.SUBTRACT)
    add(corte_extrus_o9_tool2.solids().sort_by_distance((-70.710678, -70.710678, 22))[0], mode=Mode.SUBTRACT)
    add(corte_extrus_o9_tool3.solids().sort_by_distance((-70.710678, 70.710678, 22))[0], mode=Mode.SUBTRACT)
    add(corte_extrus_o9_tool4.solids().sort_by_distance((70.710678, 70.710678, 22))[0], mode=Mode.SUBTRACT)
    add(corte_extrus_o9_tool5.solids().sort_by_distance((70.710678, -70.710678, 22))[0], mode=Mode.SUBTRACT)


solid = part.part
